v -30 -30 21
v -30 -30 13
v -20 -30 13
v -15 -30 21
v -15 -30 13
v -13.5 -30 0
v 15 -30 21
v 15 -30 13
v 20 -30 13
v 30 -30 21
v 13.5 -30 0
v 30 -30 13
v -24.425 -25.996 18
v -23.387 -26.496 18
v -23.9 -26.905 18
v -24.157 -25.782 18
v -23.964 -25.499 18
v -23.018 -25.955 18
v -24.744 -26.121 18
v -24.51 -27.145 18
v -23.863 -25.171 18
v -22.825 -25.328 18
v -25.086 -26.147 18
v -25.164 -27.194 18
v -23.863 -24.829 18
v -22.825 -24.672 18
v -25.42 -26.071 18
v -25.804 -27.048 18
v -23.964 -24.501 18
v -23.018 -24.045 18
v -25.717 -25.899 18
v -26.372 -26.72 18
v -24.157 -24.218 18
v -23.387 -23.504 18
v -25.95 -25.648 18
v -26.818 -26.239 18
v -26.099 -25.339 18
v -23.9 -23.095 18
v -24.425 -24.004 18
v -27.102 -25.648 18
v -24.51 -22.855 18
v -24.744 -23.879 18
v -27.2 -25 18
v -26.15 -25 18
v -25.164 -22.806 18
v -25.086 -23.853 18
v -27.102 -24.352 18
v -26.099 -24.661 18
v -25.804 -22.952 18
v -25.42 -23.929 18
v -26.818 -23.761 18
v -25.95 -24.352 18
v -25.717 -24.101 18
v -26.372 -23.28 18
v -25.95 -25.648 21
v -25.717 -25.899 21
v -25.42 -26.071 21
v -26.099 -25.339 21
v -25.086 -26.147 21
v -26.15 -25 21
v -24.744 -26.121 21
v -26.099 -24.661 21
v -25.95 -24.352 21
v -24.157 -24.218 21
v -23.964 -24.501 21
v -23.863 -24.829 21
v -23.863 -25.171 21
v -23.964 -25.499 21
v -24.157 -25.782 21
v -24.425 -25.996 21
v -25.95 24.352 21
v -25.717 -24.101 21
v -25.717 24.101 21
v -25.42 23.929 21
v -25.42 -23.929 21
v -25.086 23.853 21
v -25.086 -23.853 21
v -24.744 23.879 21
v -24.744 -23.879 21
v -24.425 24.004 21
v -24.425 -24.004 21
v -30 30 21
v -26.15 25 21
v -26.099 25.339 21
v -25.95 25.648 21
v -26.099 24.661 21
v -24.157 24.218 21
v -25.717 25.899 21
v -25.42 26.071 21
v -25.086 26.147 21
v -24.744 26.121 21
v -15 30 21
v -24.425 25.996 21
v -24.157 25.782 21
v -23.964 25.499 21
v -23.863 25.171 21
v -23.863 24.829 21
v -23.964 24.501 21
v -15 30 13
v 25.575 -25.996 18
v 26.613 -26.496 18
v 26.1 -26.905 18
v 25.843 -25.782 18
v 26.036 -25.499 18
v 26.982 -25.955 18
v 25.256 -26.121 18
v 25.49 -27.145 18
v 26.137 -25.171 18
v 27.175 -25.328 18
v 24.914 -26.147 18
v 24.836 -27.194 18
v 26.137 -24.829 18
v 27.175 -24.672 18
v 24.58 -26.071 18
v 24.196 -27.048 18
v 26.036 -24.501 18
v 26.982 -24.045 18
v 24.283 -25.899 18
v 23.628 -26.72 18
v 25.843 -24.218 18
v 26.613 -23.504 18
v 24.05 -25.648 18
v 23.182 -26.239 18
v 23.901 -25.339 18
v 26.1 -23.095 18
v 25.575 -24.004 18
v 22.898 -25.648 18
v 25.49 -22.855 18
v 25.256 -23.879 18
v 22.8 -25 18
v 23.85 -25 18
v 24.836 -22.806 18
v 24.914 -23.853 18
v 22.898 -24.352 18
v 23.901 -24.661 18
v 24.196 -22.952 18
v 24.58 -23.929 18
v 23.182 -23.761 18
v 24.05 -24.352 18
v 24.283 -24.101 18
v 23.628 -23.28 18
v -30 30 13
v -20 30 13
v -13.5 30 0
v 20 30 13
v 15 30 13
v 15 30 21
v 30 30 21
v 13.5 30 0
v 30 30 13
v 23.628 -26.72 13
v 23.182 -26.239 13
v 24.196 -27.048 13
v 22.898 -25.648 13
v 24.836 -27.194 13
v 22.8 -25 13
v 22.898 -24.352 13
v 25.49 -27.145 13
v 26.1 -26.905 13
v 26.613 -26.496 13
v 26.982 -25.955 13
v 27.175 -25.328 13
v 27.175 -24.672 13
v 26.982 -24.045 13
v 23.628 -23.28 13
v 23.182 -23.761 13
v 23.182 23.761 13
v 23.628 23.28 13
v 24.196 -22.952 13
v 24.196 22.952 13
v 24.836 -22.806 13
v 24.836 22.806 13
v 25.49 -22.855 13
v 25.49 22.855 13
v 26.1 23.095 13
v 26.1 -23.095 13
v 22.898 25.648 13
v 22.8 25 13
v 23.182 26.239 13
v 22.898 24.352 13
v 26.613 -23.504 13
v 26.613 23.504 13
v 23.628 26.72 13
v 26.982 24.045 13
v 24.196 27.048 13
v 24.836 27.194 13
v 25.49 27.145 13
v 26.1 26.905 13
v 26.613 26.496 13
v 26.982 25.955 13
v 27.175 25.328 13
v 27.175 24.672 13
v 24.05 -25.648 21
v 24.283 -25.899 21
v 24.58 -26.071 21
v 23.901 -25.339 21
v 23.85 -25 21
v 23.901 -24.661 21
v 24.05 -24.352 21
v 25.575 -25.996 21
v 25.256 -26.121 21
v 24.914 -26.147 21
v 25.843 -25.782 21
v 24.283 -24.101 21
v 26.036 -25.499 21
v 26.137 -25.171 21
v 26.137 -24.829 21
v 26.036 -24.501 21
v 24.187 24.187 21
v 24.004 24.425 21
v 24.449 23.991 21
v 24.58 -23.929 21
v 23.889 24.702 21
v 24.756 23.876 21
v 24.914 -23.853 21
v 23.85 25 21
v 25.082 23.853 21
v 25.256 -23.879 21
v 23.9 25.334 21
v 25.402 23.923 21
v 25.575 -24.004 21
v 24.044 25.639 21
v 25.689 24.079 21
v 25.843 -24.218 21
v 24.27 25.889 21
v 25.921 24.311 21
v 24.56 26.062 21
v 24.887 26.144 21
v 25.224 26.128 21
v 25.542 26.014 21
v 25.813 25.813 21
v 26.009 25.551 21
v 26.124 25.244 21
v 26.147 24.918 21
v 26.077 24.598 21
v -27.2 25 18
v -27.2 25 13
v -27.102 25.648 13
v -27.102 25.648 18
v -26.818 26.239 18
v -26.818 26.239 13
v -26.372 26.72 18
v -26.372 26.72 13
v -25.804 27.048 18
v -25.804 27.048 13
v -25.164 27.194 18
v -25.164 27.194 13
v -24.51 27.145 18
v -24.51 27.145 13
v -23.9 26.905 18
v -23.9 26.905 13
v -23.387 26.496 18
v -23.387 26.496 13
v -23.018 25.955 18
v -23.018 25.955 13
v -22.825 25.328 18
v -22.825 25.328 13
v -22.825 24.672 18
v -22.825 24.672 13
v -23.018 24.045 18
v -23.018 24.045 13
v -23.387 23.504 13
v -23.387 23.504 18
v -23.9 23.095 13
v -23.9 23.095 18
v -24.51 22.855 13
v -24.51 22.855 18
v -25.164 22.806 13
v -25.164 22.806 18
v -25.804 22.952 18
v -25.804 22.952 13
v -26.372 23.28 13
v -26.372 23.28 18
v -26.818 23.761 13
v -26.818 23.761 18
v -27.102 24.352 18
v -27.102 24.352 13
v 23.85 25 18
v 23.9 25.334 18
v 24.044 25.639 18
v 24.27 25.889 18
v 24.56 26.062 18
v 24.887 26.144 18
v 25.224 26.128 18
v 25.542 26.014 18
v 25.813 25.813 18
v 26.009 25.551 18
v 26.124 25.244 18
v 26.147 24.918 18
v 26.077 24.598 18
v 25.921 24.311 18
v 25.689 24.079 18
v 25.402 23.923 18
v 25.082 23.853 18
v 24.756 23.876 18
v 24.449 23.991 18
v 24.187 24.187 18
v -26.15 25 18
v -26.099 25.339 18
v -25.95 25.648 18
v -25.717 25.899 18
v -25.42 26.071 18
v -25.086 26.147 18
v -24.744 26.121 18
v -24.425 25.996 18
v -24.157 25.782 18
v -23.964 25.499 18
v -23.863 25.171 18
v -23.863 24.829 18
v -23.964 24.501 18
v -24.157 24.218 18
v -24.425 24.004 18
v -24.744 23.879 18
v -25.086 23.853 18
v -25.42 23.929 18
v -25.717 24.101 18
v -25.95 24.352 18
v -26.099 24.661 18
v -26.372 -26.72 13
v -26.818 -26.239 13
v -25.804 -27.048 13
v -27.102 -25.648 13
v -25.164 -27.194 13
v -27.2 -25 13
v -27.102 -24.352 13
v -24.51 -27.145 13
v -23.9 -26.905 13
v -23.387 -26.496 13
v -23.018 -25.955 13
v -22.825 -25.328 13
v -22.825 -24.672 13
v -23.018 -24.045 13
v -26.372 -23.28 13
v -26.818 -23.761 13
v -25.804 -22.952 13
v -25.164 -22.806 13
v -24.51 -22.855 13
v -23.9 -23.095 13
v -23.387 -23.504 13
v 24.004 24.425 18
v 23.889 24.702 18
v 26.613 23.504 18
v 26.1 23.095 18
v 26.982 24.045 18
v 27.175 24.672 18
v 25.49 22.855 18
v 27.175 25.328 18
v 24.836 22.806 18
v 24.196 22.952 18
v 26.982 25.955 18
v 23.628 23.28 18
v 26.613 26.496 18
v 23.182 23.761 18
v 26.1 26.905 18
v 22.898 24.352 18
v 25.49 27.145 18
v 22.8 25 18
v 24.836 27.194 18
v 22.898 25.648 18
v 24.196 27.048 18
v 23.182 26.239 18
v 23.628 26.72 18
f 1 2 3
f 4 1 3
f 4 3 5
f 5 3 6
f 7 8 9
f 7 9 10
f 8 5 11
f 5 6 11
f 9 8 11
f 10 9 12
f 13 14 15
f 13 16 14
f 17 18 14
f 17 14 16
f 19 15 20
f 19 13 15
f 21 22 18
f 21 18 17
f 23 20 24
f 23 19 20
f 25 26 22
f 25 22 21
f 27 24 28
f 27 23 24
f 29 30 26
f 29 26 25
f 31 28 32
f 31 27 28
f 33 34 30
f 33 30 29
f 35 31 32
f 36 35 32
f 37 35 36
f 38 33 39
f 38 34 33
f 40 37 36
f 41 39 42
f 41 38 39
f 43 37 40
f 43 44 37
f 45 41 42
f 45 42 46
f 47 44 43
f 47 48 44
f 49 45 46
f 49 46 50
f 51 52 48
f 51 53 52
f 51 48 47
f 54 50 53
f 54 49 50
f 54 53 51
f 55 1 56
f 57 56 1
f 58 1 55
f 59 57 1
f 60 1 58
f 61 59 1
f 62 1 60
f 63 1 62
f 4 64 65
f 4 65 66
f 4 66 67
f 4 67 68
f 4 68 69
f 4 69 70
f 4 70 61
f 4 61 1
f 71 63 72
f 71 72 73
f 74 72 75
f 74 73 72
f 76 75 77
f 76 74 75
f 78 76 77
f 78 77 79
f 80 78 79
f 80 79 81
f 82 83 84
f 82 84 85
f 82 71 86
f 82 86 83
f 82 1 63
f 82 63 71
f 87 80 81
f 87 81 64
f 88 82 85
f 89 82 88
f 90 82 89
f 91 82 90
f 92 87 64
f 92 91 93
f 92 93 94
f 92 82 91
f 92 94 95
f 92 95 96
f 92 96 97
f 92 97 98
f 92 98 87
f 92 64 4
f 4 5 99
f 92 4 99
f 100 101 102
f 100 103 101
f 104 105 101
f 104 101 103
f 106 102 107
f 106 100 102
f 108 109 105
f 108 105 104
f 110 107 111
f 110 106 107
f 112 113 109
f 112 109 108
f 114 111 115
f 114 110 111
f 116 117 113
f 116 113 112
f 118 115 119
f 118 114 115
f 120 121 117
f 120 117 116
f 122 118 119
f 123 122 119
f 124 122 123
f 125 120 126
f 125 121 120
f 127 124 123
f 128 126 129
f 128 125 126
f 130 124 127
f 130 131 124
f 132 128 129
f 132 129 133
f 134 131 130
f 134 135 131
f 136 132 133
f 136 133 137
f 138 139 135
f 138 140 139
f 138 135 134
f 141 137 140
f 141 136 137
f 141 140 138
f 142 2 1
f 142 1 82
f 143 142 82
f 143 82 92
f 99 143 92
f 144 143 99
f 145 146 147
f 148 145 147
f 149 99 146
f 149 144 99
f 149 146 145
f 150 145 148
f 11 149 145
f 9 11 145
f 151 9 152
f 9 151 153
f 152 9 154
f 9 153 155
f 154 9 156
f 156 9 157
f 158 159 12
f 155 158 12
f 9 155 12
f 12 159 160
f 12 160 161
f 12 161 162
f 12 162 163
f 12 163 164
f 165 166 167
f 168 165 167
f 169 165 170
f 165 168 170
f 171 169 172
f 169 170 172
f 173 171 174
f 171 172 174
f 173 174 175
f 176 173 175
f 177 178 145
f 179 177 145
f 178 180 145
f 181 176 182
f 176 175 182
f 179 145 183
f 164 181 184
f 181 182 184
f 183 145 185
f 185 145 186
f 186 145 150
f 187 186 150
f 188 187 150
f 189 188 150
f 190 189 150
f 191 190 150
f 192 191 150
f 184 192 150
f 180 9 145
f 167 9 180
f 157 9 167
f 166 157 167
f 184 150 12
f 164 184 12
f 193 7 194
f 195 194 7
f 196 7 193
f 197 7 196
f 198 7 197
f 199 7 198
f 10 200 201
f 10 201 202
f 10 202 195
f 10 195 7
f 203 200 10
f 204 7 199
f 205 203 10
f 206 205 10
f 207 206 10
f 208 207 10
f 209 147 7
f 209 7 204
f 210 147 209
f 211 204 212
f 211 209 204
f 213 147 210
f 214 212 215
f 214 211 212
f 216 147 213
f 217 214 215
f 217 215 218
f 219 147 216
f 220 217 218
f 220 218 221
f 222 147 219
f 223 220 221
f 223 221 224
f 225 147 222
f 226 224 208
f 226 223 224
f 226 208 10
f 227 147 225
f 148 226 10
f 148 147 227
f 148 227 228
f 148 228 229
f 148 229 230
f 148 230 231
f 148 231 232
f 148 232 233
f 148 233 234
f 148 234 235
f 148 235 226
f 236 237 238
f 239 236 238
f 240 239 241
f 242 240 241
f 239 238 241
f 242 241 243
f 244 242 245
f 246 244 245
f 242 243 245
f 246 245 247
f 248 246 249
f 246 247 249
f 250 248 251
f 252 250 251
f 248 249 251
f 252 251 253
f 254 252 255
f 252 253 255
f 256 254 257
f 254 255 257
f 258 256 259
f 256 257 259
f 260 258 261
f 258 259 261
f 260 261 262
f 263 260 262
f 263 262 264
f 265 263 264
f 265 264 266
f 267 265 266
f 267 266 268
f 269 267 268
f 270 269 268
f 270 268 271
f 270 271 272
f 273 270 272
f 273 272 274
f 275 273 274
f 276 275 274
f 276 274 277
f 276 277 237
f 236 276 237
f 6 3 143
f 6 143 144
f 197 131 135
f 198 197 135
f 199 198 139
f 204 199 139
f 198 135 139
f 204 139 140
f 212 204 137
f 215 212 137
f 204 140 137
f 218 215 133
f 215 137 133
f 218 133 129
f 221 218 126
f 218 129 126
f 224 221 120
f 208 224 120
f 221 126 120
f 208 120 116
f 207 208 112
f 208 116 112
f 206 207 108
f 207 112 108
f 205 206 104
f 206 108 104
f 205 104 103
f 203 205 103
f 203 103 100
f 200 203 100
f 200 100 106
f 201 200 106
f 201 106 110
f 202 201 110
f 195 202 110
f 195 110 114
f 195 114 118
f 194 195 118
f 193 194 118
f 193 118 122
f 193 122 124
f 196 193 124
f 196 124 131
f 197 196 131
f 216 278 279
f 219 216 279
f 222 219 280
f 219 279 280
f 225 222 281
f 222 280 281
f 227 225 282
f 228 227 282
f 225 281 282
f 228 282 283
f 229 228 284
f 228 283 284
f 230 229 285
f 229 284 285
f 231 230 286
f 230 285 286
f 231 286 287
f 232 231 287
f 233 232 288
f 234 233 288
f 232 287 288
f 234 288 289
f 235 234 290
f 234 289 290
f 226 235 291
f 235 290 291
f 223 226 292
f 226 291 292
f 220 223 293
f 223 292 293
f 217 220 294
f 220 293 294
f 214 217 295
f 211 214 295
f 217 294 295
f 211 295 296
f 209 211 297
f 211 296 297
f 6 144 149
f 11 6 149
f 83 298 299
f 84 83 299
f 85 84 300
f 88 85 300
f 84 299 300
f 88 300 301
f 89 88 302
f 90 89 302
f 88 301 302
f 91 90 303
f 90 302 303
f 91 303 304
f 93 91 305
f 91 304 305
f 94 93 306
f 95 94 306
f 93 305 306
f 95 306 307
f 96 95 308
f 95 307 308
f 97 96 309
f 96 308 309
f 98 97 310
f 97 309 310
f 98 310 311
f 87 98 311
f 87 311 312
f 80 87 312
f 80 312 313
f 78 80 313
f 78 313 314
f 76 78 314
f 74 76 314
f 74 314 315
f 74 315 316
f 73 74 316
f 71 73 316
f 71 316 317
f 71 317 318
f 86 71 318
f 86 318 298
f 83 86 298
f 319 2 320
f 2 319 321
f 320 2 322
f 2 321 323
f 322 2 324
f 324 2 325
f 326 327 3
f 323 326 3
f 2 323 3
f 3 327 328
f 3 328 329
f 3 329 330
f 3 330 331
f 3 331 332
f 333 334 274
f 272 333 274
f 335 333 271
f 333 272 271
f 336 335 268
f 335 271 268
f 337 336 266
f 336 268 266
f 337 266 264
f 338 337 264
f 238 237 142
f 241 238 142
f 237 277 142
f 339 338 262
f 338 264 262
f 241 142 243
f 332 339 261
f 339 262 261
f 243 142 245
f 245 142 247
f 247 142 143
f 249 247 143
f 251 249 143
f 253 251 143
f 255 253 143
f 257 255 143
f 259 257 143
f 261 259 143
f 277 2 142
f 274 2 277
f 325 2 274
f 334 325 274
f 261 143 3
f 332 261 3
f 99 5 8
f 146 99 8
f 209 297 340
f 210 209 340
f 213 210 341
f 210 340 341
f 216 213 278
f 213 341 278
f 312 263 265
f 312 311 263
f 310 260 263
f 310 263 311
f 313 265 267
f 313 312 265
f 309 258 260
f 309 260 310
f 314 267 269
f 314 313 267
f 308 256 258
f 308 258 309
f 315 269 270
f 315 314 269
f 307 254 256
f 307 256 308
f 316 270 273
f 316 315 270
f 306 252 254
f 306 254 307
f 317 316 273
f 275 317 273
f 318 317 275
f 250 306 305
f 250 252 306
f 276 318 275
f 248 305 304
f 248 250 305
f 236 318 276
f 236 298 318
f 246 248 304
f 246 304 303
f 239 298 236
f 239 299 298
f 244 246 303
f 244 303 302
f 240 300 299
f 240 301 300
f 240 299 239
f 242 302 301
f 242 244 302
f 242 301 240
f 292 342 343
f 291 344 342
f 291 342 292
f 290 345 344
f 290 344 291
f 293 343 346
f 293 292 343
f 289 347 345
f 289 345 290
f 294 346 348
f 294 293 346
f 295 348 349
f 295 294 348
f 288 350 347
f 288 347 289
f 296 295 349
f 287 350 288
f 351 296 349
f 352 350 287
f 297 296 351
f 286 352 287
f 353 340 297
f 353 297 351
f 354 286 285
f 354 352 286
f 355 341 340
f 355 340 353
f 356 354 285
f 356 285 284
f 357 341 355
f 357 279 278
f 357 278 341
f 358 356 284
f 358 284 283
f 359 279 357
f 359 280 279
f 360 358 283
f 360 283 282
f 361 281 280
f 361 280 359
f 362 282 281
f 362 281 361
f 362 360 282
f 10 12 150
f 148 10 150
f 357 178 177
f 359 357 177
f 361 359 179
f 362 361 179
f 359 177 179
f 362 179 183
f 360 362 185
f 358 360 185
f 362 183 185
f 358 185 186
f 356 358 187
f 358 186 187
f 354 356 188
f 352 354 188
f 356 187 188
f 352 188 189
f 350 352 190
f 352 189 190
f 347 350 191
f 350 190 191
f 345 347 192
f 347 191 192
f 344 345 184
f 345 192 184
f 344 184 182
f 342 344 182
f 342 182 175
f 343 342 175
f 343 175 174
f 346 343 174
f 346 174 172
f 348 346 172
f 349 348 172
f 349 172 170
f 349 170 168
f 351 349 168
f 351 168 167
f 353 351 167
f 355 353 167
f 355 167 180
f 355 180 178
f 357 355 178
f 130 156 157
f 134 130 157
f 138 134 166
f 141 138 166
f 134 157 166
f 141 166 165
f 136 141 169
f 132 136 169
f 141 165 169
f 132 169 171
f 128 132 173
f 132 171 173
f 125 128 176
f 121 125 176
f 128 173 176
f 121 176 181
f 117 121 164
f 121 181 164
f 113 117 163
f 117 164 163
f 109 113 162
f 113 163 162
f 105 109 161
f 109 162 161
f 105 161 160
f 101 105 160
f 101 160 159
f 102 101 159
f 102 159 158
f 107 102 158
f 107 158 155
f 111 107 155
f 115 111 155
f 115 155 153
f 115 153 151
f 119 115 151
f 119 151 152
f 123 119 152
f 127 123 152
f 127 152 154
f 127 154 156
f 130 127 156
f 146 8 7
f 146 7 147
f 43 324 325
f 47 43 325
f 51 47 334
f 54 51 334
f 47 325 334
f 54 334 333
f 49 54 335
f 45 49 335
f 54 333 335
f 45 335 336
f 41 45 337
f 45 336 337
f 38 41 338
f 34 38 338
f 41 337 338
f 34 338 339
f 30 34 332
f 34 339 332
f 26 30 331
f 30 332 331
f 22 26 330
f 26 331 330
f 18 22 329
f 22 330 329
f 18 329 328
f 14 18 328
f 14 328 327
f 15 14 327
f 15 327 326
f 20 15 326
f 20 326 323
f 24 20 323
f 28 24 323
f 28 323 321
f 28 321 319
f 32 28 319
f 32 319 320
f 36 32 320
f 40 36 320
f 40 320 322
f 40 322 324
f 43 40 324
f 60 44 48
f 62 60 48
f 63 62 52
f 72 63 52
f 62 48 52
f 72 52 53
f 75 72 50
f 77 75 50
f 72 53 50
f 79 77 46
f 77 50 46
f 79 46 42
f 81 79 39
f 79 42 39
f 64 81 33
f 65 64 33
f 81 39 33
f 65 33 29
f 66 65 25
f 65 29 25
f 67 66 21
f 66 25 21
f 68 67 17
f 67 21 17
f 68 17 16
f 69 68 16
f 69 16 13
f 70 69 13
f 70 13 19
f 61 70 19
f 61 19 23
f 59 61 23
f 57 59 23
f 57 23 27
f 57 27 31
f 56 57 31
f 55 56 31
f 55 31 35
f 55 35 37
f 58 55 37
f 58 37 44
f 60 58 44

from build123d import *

# Parameters (mm, degrees)
SKETCH1_W           = 60
SKETCH1_H           = 60
BOSS_EXTRUDE1_DEPTH = 13
SKETCH2_W           = 15
SKETCH2_H           = 60
BOSS_EXTRUDE2_DEPTH = 8
SKETCH3_R           = 1.15
CUT_EXTRUDE1_DEPTH  = 48.339201514
SKETCH4_R           = 2.2
CUT_EXTRUDE2_DEPTH  = 18
CUT_EXTRUDE4_DEPTH  = 71.292247083


with BuildPart() as part:
    # Sketch1 → Boss-Extrude1 (new body)
    with BuildSketch(Plane.XY):
        Rectangle(SKETCH1_W, SKETCH1_H)
    extrude(amount=BOSS_EXTRUDE1_DEPTH)

    # Sketch2 → Boss-Extrude2 (add)
    with BuildSketch(Plane.XY.offset(13)):
        with Locations((-22.5, 0)):
            Rectangle(SKETCH2_W, SKETCH2_H)
        with Locations((22.5, 0)):
            Rectangle(SKETCH2_W, SKETCH2_H)
    extrude(amount=BOSS_EXTRUDE2_DEPTH)

    # Sketch3 → Cut-Extrude1 (cut, through all)
    with BuildSketch(Plane(origin=(0, 0, 0), x_dir=(-1, 0, 0), z_dir=(0, 0, -1))):
        with Locations((25, 25)):
            Circle(SKETCH3_R)
        with Locations((25, -25)):
            Circle(SKETCH3_R)
        with Locations((-25, -25)):
            Circle(SKETCH3_R)
        with BuildLine():
            ThreePointArc((-25.813172798, 25.813172798), (-25.813172798, 24.186827202), (-24.186827202, 24.186827202))
            Line((-24.186827202, 24.186827202), (-25.813172798, 25.813172798))
        make_face()
        with BuildLine():
            Line((-25.813172798, 25.813172798), (-24.186827202, 24.186827202))
            ThreePointArc((-24.186827202, 24.186827202), (-23.937538538, 24.559914053), (-23.85, 25))
            ThreePointArc((-23.85, 25), (-24.559914053, 26.062461462), (-25.813172798, 25.813172798))
        make_face()
    extrude(amount=-CUT_EXTRUDE1_DEPTH, mode=Mode.SUBTRACT)

    # Sketch4 → Cut-Extrude2 (cut)
    with BuildSketch(Plane(origin=(0, 0, 0), x_dir=(-1, 0, 0), z_dir=(0, 0, -1))):
        with Locations((-25, 25)):
            Circle(SKETCH4_R)
        with Locations((25, 25)):
            Circle(SKETCH4_R)
        with Locations((25, -25)):
            Circle(SKETCH4_R)
        with Locations((-25, -25)):
            Circle(SKETCH4_R)
    extrude(amount=-CUT_EXTRUDE2_DEPTH, mode=Mode.SUBTRACT)

    # Sketch6 → Cut-Extrude4 (cut, through all)
    with BuildSketch(Plane(origin=(0, 30, 0), x_dir=(1, 0, 0), z_dir=(0, 1, 0))):
        Polygon((-30, 0), (-30, -13), (-20, -13), (-13.5, 0), align=None)
        Polygon((30, 0), (13.5, 0), (20, -13), (30, -13), align=None)
    extrude(amount=-CUT_EXTRUDE4_DEPTH, mode=Mode.SUBTRACT)


solid = part.part
